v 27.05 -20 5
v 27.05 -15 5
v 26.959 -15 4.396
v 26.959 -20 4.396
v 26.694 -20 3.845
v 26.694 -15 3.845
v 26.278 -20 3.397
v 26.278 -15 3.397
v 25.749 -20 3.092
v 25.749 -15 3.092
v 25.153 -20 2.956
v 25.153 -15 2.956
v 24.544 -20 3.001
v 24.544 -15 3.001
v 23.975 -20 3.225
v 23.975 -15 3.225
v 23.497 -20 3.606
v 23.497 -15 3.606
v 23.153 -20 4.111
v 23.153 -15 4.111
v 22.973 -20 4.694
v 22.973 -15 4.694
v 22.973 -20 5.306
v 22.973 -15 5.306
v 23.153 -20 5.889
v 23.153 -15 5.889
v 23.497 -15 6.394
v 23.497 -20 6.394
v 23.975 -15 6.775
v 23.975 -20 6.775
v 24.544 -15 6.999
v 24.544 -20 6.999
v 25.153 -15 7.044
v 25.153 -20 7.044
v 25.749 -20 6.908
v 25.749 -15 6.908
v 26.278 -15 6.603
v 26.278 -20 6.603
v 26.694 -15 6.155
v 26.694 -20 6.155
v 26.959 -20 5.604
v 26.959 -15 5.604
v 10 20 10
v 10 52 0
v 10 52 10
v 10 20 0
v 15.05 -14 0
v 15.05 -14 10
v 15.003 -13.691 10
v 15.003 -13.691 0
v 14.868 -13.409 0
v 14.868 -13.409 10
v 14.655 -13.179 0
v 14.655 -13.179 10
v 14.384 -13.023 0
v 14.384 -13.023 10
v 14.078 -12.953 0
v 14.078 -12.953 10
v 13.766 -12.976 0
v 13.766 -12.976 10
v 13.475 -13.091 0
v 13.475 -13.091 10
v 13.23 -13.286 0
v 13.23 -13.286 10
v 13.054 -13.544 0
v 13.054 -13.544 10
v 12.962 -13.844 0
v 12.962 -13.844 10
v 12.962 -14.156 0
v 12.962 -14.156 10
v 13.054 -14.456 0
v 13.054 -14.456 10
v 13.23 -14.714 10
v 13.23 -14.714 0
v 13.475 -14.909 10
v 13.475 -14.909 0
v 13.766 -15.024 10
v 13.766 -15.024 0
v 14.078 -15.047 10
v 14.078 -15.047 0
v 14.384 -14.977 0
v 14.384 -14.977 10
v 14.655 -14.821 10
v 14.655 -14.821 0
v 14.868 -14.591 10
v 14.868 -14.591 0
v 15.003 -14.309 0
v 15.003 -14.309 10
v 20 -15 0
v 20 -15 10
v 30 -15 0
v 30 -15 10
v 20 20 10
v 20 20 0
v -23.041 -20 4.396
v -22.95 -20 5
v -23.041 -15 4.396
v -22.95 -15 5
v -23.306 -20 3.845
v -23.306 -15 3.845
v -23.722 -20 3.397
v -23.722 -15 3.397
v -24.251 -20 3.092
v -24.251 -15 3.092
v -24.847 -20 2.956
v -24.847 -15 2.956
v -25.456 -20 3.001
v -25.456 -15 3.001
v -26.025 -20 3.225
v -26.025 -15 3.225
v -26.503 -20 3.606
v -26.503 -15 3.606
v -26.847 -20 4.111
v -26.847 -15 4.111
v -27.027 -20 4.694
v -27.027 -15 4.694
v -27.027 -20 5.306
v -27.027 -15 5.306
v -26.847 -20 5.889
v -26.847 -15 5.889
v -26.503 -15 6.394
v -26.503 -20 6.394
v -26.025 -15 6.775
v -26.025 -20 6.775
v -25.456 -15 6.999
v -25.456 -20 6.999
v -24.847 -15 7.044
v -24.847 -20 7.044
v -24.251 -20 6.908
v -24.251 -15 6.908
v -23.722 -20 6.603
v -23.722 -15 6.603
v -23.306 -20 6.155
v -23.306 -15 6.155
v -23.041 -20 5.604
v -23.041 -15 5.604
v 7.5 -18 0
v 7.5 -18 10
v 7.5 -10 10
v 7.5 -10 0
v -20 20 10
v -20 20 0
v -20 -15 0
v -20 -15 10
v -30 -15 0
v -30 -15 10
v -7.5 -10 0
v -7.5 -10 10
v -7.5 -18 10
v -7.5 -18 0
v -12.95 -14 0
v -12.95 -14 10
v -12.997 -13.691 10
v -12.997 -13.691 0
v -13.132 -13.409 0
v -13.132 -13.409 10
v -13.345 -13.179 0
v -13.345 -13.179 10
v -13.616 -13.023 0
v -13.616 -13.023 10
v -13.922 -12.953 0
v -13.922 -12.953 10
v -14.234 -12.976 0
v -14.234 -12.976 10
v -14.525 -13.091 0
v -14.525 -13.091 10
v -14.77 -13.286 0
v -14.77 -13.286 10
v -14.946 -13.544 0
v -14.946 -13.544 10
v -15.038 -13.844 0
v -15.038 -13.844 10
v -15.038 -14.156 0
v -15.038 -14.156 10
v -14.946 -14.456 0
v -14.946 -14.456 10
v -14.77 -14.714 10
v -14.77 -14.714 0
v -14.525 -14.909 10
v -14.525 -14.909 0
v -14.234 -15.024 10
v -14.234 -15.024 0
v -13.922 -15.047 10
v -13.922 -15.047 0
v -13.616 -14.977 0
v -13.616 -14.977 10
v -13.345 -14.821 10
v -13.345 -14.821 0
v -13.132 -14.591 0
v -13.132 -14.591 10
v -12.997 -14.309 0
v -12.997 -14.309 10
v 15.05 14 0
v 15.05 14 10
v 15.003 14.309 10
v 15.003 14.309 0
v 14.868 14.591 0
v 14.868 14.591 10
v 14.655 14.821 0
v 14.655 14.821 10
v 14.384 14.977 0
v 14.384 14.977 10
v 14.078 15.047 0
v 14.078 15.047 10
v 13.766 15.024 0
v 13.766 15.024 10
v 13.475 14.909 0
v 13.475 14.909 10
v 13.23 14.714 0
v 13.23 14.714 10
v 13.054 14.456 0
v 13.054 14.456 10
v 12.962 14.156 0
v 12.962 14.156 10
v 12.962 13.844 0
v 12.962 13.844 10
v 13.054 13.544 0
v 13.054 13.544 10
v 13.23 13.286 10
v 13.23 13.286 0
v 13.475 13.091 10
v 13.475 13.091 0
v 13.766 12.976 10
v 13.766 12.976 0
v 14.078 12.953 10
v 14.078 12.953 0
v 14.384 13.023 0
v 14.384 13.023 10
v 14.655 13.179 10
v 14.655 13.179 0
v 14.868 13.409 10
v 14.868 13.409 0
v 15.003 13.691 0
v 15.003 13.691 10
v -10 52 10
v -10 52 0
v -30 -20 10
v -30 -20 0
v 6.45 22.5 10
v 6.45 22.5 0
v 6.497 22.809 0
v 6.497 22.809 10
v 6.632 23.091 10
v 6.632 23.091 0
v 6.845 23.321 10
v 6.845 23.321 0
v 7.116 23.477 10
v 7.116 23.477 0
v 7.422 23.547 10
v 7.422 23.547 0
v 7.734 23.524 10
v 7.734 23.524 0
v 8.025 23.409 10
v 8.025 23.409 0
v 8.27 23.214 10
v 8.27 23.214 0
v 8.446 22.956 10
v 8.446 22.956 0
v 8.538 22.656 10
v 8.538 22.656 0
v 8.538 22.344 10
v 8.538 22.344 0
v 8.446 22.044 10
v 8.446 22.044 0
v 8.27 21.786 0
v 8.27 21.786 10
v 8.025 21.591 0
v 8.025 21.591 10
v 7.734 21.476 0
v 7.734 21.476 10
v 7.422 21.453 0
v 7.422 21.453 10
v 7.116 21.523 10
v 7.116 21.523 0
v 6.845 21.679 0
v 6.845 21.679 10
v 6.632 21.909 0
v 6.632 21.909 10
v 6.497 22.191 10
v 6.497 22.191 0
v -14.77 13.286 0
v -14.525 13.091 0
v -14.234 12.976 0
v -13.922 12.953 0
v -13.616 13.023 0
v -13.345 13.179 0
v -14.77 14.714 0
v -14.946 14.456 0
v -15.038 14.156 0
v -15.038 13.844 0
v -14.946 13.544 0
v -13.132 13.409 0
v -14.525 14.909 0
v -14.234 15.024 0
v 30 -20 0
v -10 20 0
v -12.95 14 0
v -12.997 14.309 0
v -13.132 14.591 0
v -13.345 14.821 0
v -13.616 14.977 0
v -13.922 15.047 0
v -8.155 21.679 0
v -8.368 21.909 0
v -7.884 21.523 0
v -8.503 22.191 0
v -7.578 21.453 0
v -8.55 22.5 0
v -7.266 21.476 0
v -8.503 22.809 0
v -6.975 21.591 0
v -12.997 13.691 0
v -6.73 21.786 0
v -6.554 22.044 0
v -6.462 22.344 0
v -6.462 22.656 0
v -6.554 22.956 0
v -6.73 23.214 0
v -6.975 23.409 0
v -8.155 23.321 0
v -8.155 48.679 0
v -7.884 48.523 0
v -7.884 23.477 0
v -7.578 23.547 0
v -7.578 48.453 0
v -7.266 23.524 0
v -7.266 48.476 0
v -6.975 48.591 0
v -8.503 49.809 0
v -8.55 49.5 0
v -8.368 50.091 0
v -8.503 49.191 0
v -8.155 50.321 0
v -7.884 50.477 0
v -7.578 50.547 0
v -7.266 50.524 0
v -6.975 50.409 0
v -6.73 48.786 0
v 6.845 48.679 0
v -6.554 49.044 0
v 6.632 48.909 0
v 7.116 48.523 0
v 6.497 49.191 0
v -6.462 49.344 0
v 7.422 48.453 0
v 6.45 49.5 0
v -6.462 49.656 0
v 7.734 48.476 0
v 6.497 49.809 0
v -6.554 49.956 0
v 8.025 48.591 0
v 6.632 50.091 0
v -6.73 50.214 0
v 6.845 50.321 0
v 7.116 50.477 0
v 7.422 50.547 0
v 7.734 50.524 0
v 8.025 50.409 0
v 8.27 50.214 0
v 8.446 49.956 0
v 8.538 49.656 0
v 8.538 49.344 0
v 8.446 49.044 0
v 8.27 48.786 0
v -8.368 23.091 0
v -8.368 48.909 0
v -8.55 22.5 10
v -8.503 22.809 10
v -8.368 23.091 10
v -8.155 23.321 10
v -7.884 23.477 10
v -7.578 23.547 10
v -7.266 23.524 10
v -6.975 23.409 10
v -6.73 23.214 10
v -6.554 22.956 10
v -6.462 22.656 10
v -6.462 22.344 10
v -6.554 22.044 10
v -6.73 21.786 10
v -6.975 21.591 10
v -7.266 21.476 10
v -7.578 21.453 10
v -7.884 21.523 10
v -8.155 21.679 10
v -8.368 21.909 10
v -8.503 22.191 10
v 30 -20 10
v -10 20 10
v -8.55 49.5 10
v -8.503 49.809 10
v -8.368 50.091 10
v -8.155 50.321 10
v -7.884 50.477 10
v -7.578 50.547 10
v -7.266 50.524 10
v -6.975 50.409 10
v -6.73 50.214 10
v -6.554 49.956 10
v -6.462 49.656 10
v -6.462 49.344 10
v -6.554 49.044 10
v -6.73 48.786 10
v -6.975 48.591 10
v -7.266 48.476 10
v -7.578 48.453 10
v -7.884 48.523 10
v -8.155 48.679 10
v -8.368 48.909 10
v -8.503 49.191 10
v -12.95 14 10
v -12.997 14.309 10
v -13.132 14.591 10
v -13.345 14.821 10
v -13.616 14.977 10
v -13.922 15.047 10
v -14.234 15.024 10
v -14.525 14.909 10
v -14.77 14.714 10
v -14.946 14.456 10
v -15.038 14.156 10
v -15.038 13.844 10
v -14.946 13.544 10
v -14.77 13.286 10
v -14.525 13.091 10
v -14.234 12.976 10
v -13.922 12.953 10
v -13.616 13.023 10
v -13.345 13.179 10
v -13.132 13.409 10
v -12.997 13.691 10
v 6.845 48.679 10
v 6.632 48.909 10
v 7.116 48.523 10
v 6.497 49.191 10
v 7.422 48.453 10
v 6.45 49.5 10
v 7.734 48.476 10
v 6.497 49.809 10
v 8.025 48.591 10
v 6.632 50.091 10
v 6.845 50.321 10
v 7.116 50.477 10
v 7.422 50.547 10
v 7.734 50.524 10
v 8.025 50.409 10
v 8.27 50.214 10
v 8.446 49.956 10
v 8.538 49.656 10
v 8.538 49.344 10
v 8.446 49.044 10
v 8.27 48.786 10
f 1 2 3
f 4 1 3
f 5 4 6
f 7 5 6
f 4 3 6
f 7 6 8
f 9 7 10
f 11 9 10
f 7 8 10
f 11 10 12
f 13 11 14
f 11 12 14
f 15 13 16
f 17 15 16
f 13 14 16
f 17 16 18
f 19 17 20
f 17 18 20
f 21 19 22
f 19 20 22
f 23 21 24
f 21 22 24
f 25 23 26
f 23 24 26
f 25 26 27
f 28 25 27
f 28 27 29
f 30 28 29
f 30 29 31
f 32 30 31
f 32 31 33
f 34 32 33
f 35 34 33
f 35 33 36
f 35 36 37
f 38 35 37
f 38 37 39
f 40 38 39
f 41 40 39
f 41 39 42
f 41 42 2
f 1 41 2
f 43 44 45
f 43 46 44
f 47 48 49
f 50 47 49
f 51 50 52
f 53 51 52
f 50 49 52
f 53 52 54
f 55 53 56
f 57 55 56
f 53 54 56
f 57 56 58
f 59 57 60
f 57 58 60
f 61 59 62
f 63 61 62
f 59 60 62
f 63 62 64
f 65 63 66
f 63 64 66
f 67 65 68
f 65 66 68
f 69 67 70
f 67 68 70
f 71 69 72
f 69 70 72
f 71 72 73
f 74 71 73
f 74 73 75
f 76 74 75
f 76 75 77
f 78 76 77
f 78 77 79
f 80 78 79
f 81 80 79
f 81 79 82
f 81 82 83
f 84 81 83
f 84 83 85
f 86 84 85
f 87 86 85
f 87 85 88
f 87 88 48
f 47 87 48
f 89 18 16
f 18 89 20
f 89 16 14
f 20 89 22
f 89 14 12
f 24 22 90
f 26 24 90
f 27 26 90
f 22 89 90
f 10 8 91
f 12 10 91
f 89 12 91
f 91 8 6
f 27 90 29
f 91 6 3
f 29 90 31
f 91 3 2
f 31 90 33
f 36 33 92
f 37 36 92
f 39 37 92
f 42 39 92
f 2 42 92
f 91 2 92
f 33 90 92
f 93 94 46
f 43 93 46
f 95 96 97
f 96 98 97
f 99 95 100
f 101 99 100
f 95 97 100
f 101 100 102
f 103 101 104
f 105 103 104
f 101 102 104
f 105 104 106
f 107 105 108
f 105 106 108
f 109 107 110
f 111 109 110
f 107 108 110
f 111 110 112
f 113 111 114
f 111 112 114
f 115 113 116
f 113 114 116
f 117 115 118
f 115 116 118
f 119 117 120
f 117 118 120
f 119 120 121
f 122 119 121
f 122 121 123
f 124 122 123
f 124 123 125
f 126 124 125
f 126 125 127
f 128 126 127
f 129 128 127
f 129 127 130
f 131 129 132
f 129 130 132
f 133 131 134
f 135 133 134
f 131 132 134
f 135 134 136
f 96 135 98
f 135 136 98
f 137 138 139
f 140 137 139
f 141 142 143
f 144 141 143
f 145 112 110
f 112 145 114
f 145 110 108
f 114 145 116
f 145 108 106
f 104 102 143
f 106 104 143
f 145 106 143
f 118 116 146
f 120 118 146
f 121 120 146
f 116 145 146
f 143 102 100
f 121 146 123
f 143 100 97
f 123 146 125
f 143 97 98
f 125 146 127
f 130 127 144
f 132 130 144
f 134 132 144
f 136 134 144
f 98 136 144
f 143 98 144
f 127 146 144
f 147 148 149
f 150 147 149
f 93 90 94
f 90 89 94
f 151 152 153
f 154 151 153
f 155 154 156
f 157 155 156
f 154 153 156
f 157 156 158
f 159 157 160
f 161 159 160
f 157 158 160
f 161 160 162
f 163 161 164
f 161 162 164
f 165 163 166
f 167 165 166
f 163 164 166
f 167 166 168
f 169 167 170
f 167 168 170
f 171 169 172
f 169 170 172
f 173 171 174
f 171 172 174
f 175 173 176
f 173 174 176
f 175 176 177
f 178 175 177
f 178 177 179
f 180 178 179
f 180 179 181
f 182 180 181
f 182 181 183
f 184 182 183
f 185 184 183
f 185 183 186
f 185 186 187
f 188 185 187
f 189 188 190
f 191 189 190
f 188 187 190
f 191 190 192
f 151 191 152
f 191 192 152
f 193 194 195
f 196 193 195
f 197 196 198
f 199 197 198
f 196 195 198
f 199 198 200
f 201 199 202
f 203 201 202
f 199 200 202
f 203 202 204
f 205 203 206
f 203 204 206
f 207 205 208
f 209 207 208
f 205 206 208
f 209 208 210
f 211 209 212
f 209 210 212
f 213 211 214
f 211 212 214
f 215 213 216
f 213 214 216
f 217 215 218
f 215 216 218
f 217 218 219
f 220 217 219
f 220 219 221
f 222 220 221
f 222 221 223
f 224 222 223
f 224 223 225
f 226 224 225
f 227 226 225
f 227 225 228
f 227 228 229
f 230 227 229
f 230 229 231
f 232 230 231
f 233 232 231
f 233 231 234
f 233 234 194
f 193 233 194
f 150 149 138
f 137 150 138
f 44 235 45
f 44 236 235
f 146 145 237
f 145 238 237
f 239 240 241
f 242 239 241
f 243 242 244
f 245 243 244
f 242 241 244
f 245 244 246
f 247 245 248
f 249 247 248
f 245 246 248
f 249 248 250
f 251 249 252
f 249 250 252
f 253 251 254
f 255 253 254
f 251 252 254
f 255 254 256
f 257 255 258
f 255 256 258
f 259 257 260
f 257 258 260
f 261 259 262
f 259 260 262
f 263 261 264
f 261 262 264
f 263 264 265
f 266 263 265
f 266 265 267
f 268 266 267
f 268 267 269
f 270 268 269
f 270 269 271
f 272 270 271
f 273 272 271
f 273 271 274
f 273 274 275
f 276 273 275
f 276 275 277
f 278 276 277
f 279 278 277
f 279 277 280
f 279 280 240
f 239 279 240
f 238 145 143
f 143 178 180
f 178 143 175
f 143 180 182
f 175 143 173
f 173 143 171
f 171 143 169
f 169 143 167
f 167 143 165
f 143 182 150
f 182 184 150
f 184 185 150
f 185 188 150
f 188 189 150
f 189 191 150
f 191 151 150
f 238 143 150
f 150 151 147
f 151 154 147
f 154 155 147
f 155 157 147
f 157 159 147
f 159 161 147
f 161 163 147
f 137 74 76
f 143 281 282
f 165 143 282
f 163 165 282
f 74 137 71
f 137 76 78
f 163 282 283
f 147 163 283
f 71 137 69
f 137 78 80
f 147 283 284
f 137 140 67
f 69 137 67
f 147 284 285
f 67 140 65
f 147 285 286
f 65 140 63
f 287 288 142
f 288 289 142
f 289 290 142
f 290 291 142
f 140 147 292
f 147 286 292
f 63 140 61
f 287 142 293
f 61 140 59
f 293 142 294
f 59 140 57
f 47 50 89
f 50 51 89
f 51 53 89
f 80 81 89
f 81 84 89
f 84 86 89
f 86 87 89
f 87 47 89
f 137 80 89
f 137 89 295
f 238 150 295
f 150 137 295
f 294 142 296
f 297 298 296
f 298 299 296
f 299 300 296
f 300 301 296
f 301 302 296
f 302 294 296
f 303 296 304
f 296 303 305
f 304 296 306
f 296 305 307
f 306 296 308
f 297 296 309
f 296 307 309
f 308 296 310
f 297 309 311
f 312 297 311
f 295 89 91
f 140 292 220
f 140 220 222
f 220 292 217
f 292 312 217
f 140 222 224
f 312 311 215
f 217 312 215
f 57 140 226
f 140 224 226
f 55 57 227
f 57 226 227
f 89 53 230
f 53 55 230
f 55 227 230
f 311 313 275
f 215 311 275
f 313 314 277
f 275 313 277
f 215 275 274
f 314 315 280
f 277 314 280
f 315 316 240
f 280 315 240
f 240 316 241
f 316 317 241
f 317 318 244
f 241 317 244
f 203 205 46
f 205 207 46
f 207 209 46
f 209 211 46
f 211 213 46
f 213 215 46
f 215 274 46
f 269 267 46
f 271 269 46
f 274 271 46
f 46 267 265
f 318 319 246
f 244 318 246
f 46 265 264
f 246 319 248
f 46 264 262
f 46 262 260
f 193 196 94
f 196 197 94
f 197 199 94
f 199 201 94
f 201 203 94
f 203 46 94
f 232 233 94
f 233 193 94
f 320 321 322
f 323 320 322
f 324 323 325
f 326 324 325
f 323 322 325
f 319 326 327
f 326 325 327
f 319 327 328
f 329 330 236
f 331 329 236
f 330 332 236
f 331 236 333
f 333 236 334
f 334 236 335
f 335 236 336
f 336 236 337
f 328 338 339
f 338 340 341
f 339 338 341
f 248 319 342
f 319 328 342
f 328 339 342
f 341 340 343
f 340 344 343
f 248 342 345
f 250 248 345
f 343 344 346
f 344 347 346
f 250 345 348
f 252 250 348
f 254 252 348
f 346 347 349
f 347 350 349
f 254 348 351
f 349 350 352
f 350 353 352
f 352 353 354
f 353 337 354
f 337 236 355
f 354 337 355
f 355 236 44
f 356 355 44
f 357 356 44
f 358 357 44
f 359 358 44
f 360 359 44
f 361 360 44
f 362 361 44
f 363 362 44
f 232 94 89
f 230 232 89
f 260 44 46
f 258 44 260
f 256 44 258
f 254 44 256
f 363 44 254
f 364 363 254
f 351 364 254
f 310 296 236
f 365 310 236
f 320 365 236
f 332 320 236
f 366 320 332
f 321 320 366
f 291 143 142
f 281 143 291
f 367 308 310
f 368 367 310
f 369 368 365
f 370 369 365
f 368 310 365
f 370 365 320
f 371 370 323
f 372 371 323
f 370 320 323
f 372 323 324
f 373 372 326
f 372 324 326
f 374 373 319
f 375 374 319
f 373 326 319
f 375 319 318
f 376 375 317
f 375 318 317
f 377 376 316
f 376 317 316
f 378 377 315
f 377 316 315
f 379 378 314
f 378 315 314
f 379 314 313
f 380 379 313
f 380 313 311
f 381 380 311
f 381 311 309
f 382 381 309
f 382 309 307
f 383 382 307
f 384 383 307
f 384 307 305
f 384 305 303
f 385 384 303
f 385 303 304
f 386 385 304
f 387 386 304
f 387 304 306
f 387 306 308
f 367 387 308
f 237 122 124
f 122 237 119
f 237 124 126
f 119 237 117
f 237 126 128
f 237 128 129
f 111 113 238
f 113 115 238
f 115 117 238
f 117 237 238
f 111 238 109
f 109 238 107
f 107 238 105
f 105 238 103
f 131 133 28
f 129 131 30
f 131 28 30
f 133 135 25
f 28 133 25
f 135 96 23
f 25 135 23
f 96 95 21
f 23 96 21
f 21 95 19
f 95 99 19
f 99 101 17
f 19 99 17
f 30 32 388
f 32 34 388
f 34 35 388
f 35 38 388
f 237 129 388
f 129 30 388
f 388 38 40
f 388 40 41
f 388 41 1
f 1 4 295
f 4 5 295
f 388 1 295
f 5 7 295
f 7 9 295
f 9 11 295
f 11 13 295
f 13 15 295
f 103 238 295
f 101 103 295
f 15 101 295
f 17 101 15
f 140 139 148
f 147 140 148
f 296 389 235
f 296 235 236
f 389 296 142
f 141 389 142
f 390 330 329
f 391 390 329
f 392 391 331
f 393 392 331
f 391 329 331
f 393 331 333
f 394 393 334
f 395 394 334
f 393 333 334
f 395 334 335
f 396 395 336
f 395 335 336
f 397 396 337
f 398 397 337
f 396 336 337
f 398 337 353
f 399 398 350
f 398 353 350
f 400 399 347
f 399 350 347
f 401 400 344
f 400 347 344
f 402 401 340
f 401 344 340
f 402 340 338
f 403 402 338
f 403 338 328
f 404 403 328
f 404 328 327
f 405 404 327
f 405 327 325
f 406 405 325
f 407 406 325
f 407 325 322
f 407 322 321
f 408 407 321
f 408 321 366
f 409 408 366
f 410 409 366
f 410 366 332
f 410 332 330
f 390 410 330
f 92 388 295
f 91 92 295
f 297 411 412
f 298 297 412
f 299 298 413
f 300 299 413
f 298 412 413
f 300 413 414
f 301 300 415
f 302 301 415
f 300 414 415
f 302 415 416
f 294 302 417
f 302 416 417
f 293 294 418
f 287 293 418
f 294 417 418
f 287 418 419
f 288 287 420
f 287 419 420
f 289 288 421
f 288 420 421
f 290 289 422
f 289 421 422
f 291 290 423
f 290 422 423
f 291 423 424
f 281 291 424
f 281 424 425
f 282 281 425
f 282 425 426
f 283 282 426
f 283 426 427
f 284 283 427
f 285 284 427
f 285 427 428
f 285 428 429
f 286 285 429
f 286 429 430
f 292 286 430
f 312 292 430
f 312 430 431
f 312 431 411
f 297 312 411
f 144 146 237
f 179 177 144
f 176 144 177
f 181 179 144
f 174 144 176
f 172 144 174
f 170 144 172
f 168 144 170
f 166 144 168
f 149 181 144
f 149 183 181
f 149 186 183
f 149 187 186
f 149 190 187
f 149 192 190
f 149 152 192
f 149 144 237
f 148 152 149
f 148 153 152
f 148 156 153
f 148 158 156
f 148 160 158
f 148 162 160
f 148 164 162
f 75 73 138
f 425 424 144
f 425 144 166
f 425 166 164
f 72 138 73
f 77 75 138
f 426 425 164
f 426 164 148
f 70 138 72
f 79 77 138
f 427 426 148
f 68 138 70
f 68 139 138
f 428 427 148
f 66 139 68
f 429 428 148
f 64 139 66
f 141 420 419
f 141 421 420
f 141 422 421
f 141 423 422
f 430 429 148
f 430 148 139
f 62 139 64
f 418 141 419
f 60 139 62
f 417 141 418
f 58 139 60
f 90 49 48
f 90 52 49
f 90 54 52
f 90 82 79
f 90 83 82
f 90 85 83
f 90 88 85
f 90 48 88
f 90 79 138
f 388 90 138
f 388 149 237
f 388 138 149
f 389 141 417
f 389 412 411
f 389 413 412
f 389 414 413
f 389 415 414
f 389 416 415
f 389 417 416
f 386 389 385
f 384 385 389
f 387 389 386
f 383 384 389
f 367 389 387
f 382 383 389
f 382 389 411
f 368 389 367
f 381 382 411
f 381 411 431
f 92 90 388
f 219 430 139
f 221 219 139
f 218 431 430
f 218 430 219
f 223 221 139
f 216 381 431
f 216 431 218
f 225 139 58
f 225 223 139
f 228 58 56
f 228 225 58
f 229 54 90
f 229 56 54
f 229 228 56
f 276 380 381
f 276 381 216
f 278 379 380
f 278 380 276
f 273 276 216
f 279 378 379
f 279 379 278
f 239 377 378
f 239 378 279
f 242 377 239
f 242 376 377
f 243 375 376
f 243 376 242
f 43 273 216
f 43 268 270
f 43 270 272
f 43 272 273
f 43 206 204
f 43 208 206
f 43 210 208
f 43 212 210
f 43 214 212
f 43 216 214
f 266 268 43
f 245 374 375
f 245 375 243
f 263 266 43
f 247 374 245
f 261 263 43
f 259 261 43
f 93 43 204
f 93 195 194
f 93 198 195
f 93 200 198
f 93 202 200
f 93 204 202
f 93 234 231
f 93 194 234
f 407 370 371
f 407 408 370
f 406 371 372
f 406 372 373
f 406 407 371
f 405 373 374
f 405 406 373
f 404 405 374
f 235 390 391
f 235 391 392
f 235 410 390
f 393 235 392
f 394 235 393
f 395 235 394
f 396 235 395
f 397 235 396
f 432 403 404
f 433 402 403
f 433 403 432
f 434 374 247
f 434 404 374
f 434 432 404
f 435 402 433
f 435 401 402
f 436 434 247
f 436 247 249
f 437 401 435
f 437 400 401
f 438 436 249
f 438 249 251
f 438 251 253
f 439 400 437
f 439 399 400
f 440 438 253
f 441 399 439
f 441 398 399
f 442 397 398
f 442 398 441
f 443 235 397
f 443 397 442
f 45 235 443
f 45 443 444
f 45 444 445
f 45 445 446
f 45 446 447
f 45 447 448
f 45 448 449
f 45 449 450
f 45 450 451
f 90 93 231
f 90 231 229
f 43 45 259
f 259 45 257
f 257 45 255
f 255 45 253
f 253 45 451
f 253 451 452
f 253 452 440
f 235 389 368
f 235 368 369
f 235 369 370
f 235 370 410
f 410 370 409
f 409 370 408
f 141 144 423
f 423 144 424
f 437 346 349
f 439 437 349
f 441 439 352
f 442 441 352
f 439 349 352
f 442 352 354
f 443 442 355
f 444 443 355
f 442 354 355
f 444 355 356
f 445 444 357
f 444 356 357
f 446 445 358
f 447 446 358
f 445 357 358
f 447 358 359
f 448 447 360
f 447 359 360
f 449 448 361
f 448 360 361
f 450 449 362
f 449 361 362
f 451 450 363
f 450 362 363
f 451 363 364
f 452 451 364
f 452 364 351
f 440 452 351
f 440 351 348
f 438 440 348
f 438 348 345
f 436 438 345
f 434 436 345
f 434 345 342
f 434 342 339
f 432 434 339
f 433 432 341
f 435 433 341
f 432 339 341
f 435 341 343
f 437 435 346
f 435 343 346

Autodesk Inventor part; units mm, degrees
ref_plane "YZ Plane" through (0, 0, 0) normal (1, 0, 0) x (0, 1, 0)
ref_plane "XZ Plane" through (0, 0, 0) normal (0, 1, 0) x (-1, 0, 0)
ref_plane "XY Plane" through (0, 0, 0) normal (0, 0, 1) x (1, 0, 0)
sketch "Sketch1" plane through (0, 0, 0) normal (0, 0, 1) x (1, 0, 0)
  line L0 (-20, -20) -> (20, -20)
  line L1 (20, -20) -> (20, 20)
  line L2 (20, 20) -> (-20, 20)
  line L3 (-20, 20) -> (-20, -20)
  line L4 (-20, -20) -> (20, 20) construction
  line L5 (20, -20) -> (-20, 20) construction
  point P0 (0, 0)
  dimension "d0" = 40
  dimension "d1" = 40
extrude "Extrusion1" add sketch "Sketch1" along normal blind 10
sketch "Sketch2" plane through (0, 0, 10) normal (0, 0, 1) x (1, 0, 0)
  circle A0 centre (-14, 14) radius 1.05
  circle A1 centre (-14, -14) radius 1.05
  circle A2 centre (14, -14) radius 1.05
  circle A3 centre (14, 14) radius 1.05
  point P0 (0, 0)
  dimension "d4" = 2.1
  dimension "d5" = 2.1
  dimension "d6" = 2.1
  dimension "d7" = 2.1
  dimension "d8" = 14
  dimension "d9" = 14
  dimension "d10" = 14
  dimension "d11" = 14
extrude "Extrusion2" cut sketch "Sketch2" against normal blind 10
sketch "Sketch3" plane through (0, 0, 10) normal (0, 0, 1) x (1, 0, 0)
  line L0 (-7.5, -18) -> (7.5, -18)
  line L1 (7.5, -18) -> (7.5, -10)
  line L2 (7.5, -10) -> (-7.5, -10)
  line L3 (-7.5, -10) -> (-7.5, -18)
  line L4 (-7.5, -18) -> (7.5, -10) construction
  line L5 (7.5, -18) -> (-7.5, -10) construction
  point P0 (0, 0)
  point P1 (0, -14)
  dimension "d14" = 15
  dimension "d15" = 8
  dimension "d16" = 14
extrude "Extrusion3" cut sketch "Sketch3" against normal blind 10
sketch "Sketch4" plane through (-20, -20, 0) normal (0, -1, 0) x (1, 0, 0)
  line L0 (0, 0) -> (-10, 0)
  line L1 (-10, 0) -> (-10, 10)
  line L2 (-10, 10) -> (0, 10)
  line L3 (0, 10) -> (0, 0)
  line L4 (50, 0) -> (40, 0)
  line L5 (40, 0) -> (40, 10)
  line L6 (40, 10) -> (50, 10)
  line L7 (50, 10) -> (50, 0)
  line L8 (0, 0) -> (0, 10) projected
  line L9 (40, 0) -> (40, 10) projected
  line L10 (0, 0) -> (40, 0) projected
  line L11 (0, 10) -> (40, 10) projected
  point P0 (20, 0)
  dimension "d19" = 10
  dimension "d20" = 10
extrude "Extrusion4" add sketch "Sketch4" against normal blind 5 contours L0 L1 L2 L3 | L5 L6 L7 L4
sketch "Sketch5" plane through (-20, -15, 0) normal (0, 1, 0) x (1, 0, 0)
  circle A0 centre (-5, -5) radius 2.05
  circle A1 centre (45, -5) radius 2.05
  line L0 (-10, 0) -> (-10, -10) projected
  line L1 (-10, -10) -> (0, -10) projected
  line L2 (50, 0) -> (40, 0) projected
  line L3 (50, -10) -> (50, 0) projected
  point P0 (20, 0)
  dimension "d23" = 4.1
  dimension "d24" = 4.1
  dimension "d25" = 5
  dimension "d26" = 5
  dimension "d27" = 5
  dimension "d28" = 5
extrude "Extrusion5" cut sketch "Sketch5" against normal blind 5
sketch "Sketch6" plane through (-20, 20, 0) normal (0, 1, 0) x (1, 0, 0)
  line L0 (30, -10) -> (10, -10)
  line L1 (10, -10) -> (10, 0)
  line L2 (10, 0) -> (30, 0)
  line L3 (30, 0) -> (30, -10)
  line L4 (40, -10) -> (0, -10) projected
  line L5 (40, 0) -> (40, -10) projected
  line L6 (40, 0) -> (0, 0) projected
  line L7 (0, 0) -> (0, -10) projected
  point P0 (20, 0)
  dimension "d33" = 20
  dimension "d34" = 10
extrude "Extrusion6" add sketch "Sketch6" along normal blind 32 contours L0 L1 L2 L3
sketch "Sketch7" plane through (0, 0, 0) normal (0, 0, -1) x (-1, 0, 0)
  circle A0 centre (-7.5, 49.5) radius 1.05
  circle A1 centre (-7.5, 22.5) radius 1.05
  circle A2 centre (7.5, 49.5) radius 1.05
  circle A3 centre (7.5, 22.5) radius 1.05
  line L0 (-10, 52) -> (10, 52) projected
  line L1 (-10, 20) -> (-10, 52) projected
  point P0 (0, 0)
  dimension "d35" = 2.1
  dimension "d36" = 2.1
  dimension "d37" = 2.1
  dimension "d38" = 2.1
  dimension "d39" = 15
  dimension "d40" = 27
  dimension "d41" = 2.5
  dimension "d42" = 2.5
extrude "Extrusion7" cut sketch "Sketch7" against normal blind 32
properties part number "camera_new"
